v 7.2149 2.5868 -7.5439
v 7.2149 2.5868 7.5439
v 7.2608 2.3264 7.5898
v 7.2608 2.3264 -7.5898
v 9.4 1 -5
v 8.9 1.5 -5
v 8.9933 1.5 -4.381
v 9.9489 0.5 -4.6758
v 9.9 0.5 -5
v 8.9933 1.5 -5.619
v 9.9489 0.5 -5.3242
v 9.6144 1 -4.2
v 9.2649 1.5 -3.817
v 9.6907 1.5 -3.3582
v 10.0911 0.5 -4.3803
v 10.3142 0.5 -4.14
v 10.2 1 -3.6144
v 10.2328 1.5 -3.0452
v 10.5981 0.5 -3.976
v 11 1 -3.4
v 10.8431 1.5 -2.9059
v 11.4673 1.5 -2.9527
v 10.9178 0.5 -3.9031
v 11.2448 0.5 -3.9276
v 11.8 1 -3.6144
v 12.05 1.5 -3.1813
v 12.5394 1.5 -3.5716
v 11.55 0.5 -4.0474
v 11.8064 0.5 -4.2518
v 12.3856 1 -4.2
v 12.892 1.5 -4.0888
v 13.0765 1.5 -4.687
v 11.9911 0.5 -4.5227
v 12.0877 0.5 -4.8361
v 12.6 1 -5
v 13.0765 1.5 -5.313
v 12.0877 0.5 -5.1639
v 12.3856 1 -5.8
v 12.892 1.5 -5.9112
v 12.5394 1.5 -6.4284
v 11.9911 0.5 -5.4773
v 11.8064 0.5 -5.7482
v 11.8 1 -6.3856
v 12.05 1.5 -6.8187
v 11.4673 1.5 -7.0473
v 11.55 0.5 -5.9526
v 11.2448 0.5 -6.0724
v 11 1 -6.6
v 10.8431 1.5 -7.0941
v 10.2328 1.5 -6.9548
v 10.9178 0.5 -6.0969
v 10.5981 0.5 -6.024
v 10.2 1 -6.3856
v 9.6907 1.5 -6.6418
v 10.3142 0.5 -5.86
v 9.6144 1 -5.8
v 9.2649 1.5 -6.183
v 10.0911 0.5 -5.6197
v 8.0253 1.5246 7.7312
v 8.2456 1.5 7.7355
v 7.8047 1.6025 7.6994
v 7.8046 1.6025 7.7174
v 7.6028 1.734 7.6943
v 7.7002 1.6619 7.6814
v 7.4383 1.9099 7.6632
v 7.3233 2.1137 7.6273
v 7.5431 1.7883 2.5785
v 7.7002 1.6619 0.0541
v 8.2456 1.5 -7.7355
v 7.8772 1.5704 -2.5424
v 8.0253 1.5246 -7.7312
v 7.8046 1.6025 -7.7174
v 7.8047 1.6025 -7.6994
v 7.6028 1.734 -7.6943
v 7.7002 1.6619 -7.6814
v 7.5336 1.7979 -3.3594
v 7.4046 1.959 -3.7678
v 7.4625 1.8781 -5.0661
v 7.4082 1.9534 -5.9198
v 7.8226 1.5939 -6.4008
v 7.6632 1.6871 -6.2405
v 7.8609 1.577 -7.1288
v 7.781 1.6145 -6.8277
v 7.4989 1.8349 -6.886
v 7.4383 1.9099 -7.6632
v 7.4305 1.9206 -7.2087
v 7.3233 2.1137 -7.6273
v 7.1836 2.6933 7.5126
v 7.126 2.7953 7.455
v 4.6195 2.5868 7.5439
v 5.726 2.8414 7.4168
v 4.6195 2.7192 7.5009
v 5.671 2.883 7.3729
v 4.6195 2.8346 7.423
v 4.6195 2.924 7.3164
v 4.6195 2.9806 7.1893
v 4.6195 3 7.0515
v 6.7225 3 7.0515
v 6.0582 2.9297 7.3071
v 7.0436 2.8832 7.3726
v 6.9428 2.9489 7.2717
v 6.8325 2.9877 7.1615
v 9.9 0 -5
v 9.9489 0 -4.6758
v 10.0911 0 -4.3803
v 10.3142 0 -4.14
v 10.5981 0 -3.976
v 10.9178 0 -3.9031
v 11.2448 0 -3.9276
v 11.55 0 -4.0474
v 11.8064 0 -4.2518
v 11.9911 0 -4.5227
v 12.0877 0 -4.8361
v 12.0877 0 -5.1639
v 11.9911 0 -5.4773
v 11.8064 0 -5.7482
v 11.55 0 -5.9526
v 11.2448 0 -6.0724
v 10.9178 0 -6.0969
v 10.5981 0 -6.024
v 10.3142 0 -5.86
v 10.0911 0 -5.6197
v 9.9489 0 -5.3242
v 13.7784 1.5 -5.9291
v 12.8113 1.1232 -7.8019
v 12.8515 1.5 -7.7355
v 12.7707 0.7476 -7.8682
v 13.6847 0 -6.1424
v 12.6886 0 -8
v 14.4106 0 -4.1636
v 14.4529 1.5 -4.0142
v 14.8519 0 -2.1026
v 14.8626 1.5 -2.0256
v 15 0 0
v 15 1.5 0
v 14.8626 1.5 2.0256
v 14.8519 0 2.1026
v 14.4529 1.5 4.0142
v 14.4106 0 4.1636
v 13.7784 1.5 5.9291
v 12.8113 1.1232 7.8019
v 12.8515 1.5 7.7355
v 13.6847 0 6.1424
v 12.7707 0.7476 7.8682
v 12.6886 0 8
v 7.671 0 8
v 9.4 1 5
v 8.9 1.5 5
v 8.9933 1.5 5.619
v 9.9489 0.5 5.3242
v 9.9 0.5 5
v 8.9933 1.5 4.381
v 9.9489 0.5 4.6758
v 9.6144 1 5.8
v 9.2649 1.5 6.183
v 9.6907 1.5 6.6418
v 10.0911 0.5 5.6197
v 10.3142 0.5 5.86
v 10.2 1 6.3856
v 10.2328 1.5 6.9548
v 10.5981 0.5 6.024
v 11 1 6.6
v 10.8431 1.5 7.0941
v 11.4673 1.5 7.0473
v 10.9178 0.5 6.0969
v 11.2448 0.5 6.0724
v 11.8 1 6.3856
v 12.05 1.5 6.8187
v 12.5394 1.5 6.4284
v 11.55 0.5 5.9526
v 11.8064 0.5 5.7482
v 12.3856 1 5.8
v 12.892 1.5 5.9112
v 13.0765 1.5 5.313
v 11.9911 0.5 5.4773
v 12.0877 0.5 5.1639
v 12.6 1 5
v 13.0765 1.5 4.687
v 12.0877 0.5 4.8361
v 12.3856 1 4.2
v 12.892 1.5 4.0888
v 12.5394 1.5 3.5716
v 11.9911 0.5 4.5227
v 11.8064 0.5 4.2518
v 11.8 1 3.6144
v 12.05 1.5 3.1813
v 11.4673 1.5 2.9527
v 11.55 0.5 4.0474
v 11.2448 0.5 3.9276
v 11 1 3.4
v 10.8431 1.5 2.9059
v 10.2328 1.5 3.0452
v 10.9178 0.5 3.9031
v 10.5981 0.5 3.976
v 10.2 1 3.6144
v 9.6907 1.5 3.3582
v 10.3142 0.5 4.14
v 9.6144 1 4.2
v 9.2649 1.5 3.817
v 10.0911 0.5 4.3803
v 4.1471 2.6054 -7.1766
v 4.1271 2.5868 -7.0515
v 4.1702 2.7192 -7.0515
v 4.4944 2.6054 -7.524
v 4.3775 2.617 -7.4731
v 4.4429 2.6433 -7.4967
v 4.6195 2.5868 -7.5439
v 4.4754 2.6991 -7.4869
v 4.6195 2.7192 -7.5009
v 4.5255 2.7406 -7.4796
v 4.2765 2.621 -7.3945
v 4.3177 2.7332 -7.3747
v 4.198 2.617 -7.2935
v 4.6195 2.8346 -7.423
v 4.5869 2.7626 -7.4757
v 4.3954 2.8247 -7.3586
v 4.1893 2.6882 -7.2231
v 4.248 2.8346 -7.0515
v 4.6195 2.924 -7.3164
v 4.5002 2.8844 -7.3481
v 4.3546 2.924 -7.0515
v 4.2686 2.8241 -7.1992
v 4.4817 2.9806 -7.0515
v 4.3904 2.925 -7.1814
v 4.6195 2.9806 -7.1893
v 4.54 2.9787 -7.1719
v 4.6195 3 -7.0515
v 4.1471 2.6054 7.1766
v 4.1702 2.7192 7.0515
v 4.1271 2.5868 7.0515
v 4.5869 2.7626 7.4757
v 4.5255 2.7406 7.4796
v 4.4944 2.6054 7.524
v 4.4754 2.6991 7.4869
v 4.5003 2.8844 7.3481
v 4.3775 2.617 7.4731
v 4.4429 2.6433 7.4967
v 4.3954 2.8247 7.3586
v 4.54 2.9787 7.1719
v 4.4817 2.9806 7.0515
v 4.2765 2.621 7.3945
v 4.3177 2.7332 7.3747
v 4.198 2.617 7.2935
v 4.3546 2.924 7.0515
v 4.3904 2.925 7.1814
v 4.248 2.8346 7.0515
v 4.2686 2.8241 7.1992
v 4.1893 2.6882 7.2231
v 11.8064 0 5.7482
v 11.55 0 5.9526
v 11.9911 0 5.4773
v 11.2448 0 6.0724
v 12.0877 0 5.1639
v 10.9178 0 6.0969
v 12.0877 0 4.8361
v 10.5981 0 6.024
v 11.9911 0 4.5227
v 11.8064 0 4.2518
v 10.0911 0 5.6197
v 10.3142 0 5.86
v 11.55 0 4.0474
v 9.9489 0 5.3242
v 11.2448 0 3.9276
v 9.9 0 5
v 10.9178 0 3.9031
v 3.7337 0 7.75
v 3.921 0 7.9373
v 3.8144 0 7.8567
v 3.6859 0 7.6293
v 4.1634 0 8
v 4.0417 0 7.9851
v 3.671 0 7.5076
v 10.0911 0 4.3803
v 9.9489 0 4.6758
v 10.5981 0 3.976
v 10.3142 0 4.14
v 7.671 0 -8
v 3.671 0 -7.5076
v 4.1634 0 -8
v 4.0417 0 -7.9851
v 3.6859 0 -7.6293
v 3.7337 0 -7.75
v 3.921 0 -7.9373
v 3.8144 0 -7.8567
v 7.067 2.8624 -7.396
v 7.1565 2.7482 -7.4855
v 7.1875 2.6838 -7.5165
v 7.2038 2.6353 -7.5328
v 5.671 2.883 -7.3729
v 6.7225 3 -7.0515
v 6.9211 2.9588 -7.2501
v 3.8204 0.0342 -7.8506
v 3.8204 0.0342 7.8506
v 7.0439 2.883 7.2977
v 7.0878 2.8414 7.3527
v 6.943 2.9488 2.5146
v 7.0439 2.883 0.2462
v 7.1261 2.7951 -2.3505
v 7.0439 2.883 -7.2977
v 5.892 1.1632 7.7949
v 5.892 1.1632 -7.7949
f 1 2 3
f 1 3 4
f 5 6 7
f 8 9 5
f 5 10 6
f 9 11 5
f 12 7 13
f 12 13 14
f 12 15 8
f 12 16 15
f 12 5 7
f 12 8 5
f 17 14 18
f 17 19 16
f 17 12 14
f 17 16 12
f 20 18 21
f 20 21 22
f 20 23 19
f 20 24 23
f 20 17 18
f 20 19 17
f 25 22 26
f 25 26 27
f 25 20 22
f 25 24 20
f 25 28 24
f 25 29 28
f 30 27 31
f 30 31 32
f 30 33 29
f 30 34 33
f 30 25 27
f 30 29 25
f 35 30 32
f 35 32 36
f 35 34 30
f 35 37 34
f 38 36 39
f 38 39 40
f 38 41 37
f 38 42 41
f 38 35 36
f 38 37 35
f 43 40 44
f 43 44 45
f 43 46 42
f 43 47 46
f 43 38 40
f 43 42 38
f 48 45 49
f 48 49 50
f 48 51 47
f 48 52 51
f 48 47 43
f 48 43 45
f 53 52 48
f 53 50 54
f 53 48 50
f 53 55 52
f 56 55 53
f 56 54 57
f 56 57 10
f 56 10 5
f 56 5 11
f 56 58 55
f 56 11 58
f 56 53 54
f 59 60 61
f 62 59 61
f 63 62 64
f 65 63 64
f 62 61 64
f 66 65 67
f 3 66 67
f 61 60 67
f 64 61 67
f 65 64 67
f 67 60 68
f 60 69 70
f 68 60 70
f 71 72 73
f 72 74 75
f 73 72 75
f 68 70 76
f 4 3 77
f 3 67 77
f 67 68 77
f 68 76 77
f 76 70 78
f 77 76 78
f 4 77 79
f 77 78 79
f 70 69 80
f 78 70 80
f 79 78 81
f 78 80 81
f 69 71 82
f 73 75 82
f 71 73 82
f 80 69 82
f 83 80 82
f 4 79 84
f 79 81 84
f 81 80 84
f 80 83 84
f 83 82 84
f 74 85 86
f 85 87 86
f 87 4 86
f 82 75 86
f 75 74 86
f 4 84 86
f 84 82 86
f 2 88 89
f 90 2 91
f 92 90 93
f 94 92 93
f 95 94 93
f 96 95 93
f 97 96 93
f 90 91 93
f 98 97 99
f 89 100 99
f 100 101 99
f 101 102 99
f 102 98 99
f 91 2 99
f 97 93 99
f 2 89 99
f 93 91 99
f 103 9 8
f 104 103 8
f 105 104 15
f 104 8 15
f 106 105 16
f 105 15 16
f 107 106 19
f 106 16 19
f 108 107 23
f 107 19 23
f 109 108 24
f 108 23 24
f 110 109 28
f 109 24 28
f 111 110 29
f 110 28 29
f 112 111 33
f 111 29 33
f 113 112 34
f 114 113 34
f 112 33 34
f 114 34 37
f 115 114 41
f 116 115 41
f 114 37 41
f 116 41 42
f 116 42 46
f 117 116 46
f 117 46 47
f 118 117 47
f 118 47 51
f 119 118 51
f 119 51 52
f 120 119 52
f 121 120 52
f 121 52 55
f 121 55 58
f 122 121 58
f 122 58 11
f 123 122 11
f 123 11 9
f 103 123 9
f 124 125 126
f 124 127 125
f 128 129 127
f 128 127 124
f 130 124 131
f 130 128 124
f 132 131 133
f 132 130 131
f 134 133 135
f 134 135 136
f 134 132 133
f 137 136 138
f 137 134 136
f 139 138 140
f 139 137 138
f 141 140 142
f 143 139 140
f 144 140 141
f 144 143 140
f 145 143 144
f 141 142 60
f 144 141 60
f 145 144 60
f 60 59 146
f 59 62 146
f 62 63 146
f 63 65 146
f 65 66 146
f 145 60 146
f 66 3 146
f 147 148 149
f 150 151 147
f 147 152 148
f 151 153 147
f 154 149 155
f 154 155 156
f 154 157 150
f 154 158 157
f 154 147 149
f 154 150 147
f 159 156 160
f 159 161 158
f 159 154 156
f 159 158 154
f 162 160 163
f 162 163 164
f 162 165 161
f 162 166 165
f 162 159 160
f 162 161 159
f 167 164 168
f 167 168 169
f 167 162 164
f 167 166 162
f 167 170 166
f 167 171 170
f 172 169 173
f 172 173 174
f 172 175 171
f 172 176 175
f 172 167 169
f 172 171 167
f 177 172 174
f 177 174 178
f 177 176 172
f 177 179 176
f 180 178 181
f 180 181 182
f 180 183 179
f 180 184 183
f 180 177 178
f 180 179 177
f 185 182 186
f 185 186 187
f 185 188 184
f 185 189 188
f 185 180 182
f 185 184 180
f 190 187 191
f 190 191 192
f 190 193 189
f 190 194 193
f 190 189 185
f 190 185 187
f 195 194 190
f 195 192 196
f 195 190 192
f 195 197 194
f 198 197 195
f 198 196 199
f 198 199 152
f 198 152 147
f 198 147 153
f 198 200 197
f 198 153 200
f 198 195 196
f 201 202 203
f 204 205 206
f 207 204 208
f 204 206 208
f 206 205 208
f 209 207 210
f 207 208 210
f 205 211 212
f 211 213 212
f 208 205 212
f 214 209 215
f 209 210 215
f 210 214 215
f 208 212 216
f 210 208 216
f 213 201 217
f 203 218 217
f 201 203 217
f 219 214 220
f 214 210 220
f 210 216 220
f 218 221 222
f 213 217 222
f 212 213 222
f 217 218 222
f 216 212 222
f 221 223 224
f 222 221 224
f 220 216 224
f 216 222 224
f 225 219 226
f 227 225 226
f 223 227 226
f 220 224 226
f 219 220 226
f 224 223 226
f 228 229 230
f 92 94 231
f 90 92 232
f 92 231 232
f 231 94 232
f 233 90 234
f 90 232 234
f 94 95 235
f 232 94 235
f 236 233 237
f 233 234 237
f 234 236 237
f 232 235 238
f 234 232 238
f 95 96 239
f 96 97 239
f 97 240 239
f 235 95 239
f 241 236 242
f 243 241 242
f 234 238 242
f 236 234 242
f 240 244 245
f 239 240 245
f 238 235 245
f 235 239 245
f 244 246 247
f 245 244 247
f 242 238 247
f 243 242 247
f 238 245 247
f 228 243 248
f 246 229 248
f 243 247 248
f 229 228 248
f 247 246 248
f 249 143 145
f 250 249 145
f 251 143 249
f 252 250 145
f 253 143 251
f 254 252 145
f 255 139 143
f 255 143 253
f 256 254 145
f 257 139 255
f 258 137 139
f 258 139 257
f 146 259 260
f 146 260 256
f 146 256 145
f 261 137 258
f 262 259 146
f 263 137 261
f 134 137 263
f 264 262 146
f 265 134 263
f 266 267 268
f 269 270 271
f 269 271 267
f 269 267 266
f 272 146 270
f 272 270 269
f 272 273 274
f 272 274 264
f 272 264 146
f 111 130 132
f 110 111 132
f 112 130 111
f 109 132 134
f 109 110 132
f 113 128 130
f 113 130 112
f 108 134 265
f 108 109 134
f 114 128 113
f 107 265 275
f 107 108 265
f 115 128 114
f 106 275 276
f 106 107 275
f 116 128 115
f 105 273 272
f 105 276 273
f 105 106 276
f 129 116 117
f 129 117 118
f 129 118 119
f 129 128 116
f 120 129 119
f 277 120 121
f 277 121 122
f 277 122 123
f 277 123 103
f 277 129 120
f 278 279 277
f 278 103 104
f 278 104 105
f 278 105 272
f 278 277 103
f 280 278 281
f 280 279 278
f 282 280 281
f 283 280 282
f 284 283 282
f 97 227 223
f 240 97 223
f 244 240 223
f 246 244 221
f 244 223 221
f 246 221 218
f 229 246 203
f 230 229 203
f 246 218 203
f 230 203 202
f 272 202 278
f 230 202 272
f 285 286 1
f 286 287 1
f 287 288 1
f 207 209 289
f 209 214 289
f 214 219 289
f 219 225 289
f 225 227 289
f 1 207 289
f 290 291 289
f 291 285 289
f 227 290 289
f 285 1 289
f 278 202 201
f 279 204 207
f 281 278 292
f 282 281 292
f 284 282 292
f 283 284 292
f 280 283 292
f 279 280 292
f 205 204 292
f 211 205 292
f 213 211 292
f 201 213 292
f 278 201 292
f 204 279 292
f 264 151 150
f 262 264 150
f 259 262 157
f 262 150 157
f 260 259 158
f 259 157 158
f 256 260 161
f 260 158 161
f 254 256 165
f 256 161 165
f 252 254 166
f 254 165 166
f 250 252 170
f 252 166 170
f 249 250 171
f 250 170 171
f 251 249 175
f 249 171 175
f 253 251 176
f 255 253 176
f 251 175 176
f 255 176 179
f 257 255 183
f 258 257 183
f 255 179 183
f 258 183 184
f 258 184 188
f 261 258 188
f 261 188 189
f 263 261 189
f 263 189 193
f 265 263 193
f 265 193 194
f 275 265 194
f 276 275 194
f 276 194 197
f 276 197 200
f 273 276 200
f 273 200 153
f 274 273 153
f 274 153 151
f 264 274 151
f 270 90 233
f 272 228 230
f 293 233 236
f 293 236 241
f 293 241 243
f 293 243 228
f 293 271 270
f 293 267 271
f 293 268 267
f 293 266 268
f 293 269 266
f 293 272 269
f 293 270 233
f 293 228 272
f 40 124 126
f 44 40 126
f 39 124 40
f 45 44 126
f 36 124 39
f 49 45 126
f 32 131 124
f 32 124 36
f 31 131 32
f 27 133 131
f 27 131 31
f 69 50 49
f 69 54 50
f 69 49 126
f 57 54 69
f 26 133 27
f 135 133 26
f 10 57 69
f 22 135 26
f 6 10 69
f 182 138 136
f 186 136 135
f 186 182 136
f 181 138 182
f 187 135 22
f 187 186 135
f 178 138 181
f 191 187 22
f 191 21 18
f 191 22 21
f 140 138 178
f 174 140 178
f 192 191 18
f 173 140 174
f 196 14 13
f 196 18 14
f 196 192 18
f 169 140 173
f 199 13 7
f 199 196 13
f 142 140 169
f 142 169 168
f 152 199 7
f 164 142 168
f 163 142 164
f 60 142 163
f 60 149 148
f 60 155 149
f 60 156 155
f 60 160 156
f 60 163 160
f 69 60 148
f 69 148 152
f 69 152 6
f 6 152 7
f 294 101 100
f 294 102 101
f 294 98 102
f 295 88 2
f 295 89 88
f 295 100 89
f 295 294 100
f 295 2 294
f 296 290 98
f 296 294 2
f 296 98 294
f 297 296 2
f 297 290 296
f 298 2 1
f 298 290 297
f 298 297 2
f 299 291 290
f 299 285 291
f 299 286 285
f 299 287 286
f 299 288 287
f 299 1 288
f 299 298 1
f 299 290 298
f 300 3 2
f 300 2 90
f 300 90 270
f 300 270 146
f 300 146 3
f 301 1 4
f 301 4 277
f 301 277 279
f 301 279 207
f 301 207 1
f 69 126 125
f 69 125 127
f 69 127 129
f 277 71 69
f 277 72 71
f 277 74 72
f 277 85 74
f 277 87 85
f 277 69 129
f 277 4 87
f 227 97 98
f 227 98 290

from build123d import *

# Parameters (mm, degrees)
SKETCH_1_W               = 4
SKETCH_1_H               = 16
EXTRUDE_1_DEPTH          = 3
EXTRUDE_1_TAPER          = 10
EXTRUDE_3_DEPTH          = 1.5
EXTRUDE_4_DEPTH          = 16
CUT_EXTRUDE_1_REACH      = 19.263
CUT_EXTRUDE_1_END_RADIUS = 15
SKETCH_6_R               = 1.1
CUT_EXTRUDE_2_DEPTH      = 18.066048222
CHAMFER_1_SIZE           = 1
FILLET_2_R               = 1
FILLET_3_R               = 0.5


with BuildPart() as part:
    # Эскиз1 → Бобышка-Вытянуть1 (new body)
    with BuildSketch(Plane(origin=(0, 0, 0), x_dir=(1, 0, 0), z_dir=(0, 1, 0))):
        with Locations((5.671019058, 0)):
            Rectangle(SKETCH_1_W, SKETCH_1_H)
    extrude(amount=EXTRUDE_1_DEPTH, taper=EXTRUDE_1_TAPER)



with BuildPart() as body_2:
    # Эскиз2 → Бобышка-Вытянуть3 (new body)
    with BuildSketch(Plane(origin=(0, 0, 0), x_dir=(1, 0, 0), z_dir=(0, 1, 0))):
        with BuildLine():
            Line((7.671019058, 8), (12.68857754, 8))
            ThreePointArc((12.68857754, 8), (15, 0), (12.68857754, -8))
            Line((12.68857754, -8), (7.671019058, -8))
            Line((7.671019058, -8), (7.671019058, 8))
        make_face()
    extrude(amount=EXTRUDE_3_DEPTH)


with BuildPart() as part_1:
    add(part.part)

    add(body_2.part)  # Бобышка-Вытянуть4 merges body 2
    # Эскиз3 → Бобышка-Вытянуть4 (add)
    with BuildSketch(Plane.XY.offset(8)):
        Polygon((7.671019058, 1.5), (7.406528587, 1.5), (7.671019058, 0), align=None)
    extrude(amount=-EXTRUDE_4_DEPTH)

    # Вырез-Вытянуть1: up to this cylinder (the profile starts inside it)
    cut_extrude_1_end = Plane(origin=(0, 1, 0), z_dir=(0, -1, 0)) * Cylinder(CUT_EXTRUDE_1_END_RADIUS, 69.526, mode=Mode.PRIVATE)
    # Эскиз5 → Вырез-Вытянуть1 (cut, up to the surface)
    with BuildSketch(Plane(origin=(0, 0, 0), x_dir=(0, 0, -1), z_dir=(1, 0, 0)), mode=Mode.PRIVATE) as cut_extrude_1_sk1:
        Polygon((-8, 0), (-8, 1.5), (-7.735509529, 1.5), align=None)
    cut_extrude_1_tool1 = extrude(cut_extrude_1_sk1.sketch, amount=CUT_EXTRUDE_1_REACH, mode=Mode.PRIVATE) & cut_extrude_1_end
    add(cut_extrude_1_tool1.solids().sort_by_distance((0, 1, 7.911837))[0], mode=Mode.SUBTRACT)
    # Эскиз5 → Вырез-Вытянуть1 (cut, up to the surface)
    with BuildSketch(Plane(origin=(0, 0, 0), x_dir=(0, 0, -1), z_dir=(1, 0, 0)), mode=Mode.PRIVATE) as cut_extrude_1_sk2:
        Polygon((7.735509529, 1.5), (8, 0), (8, 1.5), align=None)
    cut_extrude_1_tool2 = extrude(cut_extrude_1_sk2.sketch, amount=CUT_EXTRUDE_1_REACH, mode=Mode.PRIVATE) & cut_extrude_1_end
    add(cut_extrude_1_tool2.solids().sort_by_distance((0, 1, -7.911837))[0], mode=Mode.SUBTRACT)

    # Эскиз6 → Вырез-Вытянуть2 (cut, through all)
    with BuildSketch(Plane(origin=(0, 1.5, 0), x_dir=(1, 0, 0), z_dir=(0, 1, 0))):
        with Locations(Location((11, 5, 0), (0, 0, 180))):
            Circle(SKETCH_6_R)
        with Locations(Location((11, -5, 0), (0, 0, 180))):
            Circle(SKETCH_6_R)
    extrude(amount=-CUT_EXTRUDE_2_DEPTH, mode=Mode.SUBTRACT)

    # Фаска1
    chamfer_1_edges = [part_1.edges().sort_by_distance(p)[0] for p in [
        (12.1, 1.5, -5),
        (12.1, 1.5, 5),
    ]]
    chamfer(chamfer_1_edges, length=CHAMFER_1_SIZE)

    # Скругление2
    fillet_2_edges = [part_1.edges().sort_by_distance(p)[0] for p in [
        (7.406528587, 1.5, 0),
    ]]
    fillet(fillet_2_edges, radius=FILLET_2_R)

    # Скругление3
    fillet_3_edges = [part_1.edges().sort_by_distance(p)[0] for p in [
        (4.2, 3, 0),
        (5.671019058, 3, 7.471019058),
        (7.142038116, 3, 0),
        (3.935509529, 1.5, 7.735509529),
        (3.935509529, 1.5, -7.735509529),
        (5.671019058, 3, -7.471019058),
    ]]
    fillet(fillet_3_edges, radius=FILLET_3_R)


solid = part_1.part
